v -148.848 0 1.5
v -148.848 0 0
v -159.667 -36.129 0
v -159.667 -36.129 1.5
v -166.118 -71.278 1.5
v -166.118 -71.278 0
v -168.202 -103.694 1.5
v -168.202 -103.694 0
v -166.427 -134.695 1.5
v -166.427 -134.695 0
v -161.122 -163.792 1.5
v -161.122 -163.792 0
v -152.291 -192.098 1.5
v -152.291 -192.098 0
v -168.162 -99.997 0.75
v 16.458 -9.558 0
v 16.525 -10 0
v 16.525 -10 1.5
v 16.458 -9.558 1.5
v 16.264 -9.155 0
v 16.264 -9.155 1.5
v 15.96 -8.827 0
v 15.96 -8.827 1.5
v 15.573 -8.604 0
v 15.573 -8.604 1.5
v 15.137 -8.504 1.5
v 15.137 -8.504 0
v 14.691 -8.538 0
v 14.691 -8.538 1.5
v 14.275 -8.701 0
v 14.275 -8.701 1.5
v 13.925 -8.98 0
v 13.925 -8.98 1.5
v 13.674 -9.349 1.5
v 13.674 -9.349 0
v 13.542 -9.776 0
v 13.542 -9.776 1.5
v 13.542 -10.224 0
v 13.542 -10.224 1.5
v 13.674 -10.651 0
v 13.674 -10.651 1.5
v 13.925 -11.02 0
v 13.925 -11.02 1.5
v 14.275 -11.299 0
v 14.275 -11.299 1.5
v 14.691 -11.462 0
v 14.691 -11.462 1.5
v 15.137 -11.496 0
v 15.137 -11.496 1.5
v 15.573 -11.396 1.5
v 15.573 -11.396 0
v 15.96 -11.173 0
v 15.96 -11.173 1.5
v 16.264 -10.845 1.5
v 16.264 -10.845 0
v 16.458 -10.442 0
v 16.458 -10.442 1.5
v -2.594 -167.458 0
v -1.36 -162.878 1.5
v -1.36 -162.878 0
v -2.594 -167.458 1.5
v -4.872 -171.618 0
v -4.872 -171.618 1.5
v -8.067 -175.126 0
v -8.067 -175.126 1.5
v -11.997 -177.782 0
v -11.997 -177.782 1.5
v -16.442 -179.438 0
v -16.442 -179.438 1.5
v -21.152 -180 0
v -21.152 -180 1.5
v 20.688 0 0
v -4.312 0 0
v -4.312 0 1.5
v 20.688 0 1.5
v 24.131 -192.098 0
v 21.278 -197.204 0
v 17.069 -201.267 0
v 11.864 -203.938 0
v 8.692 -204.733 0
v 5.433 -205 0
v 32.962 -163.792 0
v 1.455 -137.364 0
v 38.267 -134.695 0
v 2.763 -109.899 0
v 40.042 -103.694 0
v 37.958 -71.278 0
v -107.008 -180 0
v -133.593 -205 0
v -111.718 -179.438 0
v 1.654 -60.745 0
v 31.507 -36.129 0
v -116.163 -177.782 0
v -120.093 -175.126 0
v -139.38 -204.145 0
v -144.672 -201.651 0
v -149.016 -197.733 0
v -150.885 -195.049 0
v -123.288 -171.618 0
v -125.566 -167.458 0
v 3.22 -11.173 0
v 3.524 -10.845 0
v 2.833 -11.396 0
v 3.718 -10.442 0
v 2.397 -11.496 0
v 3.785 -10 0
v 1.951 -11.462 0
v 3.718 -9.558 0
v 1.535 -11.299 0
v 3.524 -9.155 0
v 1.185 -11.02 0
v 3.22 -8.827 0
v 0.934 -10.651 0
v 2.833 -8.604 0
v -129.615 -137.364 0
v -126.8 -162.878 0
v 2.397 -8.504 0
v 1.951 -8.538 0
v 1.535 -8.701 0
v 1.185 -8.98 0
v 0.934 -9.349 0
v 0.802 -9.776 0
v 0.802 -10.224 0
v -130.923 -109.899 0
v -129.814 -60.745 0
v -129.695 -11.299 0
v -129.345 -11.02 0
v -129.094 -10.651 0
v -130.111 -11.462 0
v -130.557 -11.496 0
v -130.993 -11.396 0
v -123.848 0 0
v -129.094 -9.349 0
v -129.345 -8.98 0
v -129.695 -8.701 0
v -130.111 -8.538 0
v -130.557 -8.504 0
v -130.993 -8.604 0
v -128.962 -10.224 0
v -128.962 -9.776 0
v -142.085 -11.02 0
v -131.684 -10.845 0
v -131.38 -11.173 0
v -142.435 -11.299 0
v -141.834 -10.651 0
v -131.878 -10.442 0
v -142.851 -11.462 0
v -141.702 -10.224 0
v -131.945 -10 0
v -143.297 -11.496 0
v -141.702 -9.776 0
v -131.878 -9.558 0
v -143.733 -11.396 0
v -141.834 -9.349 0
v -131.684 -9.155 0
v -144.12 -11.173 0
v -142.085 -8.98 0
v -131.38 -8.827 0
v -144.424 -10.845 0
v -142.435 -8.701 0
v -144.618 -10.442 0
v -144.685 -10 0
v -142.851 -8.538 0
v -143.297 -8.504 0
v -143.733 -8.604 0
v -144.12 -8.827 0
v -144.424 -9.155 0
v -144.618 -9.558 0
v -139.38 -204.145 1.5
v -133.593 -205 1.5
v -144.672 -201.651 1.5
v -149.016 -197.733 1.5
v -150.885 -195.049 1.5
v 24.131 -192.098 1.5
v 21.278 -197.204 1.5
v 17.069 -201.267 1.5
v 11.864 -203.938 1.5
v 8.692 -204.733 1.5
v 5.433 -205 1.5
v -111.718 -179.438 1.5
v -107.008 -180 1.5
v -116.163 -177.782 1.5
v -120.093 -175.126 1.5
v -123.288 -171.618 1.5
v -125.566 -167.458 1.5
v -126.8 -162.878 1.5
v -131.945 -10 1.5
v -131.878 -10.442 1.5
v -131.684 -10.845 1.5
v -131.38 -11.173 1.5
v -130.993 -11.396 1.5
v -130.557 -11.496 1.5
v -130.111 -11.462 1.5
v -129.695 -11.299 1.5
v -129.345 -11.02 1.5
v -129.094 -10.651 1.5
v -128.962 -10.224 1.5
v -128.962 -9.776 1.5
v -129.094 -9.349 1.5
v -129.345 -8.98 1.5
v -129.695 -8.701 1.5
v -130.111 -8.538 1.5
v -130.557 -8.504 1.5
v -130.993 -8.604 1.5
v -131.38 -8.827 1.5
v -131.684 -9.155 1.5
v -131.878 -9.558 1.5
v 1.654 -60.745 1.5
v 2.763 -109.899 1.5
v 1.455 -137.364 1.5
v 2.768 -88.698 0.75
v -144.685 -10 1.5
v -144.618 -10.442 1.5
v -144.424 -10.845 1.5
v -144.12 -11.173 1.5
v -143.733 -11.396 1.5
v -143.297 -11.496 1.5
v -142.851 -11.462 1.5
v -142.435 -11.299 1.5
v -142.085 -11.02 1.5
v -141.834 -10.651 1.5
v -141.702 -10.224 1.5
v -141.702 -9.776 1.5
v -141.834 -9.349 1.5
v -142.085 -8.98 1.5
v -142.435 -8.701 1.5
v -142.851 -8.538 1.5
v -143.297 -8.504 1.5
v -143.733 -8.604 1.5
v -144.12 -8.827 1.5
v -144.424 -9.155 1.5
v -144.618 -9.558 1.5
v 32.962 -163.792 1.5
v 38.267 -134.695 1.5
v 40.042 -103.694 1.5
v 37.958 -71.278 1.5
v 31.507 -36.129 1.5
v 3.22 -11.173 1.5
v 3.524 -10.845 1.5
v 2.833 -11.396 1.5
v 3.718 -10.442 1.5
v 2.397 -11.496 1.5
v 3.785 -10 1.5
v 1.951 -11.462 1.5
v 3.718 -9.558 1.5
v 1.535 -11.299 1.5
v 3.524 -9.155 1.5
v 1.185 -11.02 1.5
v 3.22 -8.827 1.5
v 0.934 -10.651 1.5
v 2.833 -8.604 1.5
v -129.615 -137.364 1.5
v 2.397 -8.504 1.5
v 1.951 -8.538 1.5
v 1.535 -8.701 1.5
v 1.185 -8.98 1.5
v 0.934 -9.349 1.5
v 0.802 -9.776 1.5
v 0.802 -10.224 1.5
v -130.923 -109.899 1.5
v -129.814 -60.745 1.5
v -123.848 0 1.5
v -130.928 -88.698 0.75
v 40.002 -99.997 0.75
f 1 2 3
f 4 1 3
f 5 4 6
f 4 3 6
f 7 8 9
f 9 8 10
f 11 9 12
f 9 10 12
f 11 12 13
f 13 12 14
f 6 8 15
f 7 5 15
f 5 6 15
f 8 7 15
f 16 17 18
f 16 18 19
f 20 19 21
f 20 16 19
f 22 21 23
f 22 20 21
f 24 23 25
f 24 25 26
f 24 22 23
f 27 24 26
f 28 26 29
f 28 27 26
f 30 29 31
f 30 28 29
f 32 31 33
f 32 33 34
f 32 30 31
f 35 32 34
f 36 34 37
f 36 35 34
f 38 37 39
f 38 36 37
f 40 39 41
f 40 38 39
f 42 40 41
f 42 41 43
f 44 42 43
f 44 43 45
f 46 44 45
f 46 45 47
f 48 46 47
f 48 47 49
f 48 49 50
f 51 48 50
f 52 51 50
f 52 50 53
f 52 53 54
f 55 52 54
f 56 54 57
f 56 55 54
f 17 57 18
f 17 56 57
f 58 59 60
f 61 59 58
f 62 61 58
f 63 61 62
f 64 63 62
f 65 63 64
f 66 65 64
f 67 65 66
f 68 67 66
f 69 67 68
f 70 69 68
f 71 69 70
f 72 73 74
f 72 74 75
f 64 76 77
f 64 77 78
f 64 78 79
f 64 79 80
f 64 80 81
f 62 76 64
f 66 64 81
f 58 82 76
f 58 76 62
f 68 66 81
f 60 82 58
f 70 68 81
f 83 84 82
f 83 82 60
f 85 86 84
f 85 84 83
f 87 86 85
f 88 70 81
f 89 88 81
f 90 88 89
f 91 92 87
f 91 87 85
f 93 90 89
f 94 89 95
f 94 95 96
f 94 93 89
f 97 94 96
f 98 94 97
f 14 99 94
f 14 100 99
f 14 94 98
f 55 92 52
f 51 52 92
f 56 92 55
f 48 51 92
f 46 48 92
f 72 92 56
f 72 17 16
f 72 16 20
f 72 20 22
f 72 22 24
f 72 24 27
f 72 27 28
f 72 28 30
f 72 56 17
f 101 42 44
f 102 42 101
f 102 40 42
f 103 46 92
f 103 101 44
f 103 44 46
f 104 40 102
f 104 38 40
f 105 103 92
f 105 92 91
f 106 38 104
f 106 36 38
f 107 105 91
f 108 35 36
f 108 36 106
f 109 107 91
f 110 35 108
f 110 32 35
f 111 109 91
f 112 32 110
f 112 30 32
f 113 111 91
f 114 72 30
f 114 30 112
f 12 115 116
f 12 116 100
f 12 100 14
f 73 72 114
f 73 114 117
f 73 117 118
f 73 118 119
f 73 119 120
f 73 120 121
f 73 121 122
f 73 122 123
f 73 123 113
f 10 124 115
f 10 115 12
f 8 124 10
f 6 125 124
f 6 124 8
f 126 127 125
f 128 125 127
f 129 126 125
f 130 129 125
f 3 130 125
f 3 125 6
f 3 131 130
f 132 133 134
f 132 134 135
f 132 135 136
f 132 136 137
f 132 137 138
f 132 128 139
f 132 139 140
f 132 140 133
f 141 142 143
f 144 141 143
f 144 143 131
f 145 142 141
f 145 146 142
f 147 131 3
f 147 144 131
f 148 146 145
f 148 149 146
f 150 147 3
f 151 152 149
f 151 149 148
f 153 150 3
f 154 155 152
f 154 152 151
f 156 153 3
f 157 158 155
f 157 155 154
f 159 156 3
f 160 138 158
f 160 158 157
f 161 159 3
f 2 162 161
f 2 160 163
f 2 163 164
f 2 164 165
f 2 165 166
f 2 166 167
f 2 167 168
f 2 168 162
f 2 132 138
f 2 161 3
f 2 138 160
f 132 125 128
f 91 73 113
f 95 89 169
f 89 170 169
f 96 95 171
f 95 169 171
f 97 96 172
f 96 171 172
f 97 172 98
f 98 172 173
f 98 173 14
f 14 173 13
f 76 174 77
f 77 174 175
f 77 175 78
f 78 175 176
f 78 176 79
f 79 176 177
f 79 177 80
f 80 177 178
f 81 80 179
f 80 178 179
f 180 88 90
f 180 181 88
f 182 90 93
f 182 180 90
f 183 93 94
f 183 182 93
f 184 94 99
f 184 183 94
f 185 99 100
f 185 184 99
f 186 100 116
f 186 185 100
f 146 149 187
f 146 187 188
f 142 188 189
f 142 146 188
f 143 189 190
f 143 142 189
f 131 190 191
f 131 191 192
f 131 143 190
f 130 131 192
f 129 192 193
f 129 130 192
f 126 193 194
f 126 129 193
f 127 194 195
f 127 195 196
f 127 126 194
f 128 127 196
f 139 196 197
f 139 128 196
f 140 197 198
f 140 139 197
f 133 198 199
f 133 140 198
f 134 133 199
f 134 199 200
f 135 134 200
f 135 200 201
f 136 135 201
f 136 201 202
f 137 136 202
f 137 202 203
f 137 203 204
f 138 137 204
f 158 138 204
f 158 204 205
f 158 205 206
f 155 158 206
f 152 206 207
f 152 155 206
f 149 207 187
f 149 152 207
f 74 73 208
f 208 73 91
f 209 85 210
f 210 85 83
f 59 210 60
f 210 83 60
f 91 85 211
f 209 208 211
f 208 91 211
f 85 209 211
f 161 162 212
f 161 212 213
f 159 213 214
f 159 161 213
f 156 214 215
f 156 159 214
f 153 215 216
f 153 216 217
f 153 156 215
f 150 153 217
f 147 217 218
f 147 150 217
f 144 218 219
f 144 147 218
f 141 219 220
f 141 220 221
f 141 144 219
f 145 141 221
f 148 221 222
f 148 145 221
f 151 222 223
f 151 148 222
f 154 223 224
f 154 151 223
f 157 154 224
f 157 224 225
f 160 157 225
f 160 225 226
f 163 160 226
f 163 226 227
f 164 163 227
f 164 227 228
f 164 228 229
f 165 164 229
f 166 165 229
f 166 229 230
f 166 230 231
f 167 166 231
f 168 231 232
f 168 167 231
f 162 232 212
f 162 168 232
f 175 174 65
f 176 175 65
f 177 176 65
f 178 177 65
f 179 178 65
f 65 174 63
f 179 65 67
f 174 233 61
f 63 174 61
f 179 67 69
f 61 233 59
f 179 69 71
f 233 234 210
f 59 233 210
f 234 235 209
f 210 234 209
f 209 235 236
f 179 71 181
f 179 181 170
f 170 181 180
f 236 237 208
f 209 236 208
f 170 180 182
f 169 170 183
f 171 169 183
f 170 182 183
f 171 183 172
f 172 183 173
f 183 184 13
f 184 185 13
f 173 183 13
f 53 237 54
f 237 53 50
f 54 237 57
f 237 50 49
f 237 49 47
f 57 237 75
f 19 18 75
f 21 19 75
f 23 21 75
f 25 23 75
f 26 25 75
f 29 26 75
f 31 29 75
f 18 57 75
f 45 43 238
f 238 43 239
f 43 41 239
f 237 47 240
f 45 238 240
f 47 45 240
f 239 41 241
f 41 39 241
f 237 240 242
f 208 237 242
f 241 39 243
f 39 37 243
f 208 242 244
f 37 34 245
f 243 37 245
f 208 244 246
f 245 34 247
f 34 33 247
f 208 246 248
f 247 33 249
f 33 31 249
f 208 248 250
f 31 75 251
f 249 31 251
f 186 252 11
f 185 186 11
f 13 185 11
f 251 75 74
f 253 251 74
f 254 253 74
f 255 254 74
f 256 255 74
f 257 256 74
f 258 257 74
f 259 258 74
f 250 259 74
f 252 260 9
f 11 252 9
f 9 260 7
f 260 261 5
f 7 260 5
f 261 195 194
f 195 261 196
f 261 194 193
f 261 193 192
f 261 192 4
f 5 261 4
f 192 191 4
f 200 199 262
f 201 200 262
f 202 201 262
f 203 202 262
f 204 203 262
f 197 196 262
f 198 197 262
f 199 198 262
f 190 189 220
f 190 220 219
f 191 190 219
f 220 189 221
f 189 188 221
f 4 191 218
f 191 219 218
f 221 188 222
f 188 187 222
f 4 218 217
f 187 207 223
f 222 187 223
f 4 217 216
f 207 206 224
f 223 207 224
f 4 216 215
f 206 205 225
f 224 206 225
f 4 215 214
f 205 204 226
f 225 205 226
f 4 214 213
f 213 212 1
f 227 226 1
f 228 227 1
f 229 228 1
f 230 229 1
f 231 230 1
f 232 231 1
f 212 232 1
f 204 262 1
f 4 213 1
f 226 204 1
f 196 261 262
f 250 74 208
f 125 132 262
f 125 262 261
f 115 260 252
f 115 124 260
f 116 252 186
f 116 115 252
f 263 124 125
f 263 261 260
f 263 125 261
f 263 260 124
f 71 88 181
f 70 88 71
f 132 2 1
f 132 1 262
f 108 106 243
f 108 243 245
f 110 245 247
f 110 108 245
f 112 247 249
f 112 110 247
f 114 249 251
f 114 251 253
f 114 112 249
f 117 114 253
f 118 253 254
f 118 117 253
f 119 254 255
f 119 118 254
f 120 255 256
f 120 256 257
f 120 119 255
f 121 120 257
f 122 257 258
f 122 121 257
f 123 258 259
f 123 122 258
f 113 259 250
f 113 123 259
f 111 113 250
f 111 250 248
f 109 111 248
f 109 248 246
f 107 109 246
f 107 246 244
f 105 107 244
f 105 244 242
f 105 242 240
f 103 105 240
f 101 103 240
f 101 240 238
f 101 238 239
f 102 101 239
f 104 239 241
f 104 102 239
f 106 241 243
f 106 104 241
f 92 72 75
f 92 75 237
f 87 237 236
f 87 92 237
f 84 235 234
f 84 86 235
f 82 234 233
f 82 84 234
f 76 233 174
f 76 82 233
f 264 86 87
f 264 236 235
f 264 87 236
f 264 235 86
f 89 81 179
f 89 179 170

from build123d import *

# Parameters (mm, degrees)
SKETCH1_R           = 1.5
BOSS_EXTRUDE1_DEPTH = 1.5
FILLET1_R           = 20
FILLET2_R           = 20


with BuildPart() as part:
    # Sketch1 → Boss-Extrude1 (new body)
    with BuildSketch(Plane.XY):
        with BuildLine():
            Line((-4.311554675, 0), (20.688445325, 0))
            add(Edge.make_bspline(
                [(20.688445325, 0), (60.31282649, -111.601969695), (18.819240624, -205)],
                knots=[0, 0, 0, 0.94797239, 0.94797239, 0.94797239], degree=2))
            Line((18.819240624, -205), (-146.979240624, -205))
            add(Edge.make_bspline(
                [(-148.848445325, 0), (-188.47282649, -111.601969695), (-146.979240624, -205)],
                knots=[0, 0, 0, 0.94797239, 0.94797239, 0.94797239], degree=2))
            Line((-148.848445325, 0), (-123.848445325, 0))
            add(Edge.make_bspline(
                [(-123.848445325, 0), (-138.20220228, -108.592832155), (-123.848445325, -180)],
                knots=[0, 0, 0, 0.806546207, 0.806546207, 0.806546207], degree=2))
            Line((-123.848445325, -180), (-4.311554675, -180))
            add(Edge.make_bspline(
                [(-4.311554675, 0), (10.04220228, -108.592832155), (-4.311554675, -180)],
                knots=[0, 0, 0, 0.806546207, 0.806546207, 0.806546207], degree=2))
        make_face()
        with Locations((2.285, -10)):
            Circle(SKETCH1_R, mode=Mode.SUBTRACT)
        with Locations((15.025, -10)):
            Circle(SKETCH1_R, mode=Mode.SUBTRACT)
        with Locations(Location((-143.185, -10, 0), (0, 0, 180))):
            Circle(SKETCH1_R, mode=Mode.SUBTRACT)
        with Locations(Location((-130.445, -10, 0), (0, 0, 180))):
            Circle(SKETCH1_R, mode=Mode.SUBTRACT)
    extrude(amount=BOSS_EXTRUDE1_DEPTH)

    # Fillet1
    fillet1_edges = [part.edges().sort_by_distance(p)[0] for p in [
        (-123.848445325, -180, 0.75),
        (-4.311554675, -180, 0.75),
    ]]
    fillet(fillet1_edges, radius=FILLET1_R)

    # Fillet2
    fillet2_edges = [part.edges().sort_by_distance(p)[0] for p in [
        (-146.979240624, -205, 0.75),
        (18.819240624, -205, 0.75),
    ]]
    fillet(fillet2_edges, radius=FILLET2_R)


solid = part.part
